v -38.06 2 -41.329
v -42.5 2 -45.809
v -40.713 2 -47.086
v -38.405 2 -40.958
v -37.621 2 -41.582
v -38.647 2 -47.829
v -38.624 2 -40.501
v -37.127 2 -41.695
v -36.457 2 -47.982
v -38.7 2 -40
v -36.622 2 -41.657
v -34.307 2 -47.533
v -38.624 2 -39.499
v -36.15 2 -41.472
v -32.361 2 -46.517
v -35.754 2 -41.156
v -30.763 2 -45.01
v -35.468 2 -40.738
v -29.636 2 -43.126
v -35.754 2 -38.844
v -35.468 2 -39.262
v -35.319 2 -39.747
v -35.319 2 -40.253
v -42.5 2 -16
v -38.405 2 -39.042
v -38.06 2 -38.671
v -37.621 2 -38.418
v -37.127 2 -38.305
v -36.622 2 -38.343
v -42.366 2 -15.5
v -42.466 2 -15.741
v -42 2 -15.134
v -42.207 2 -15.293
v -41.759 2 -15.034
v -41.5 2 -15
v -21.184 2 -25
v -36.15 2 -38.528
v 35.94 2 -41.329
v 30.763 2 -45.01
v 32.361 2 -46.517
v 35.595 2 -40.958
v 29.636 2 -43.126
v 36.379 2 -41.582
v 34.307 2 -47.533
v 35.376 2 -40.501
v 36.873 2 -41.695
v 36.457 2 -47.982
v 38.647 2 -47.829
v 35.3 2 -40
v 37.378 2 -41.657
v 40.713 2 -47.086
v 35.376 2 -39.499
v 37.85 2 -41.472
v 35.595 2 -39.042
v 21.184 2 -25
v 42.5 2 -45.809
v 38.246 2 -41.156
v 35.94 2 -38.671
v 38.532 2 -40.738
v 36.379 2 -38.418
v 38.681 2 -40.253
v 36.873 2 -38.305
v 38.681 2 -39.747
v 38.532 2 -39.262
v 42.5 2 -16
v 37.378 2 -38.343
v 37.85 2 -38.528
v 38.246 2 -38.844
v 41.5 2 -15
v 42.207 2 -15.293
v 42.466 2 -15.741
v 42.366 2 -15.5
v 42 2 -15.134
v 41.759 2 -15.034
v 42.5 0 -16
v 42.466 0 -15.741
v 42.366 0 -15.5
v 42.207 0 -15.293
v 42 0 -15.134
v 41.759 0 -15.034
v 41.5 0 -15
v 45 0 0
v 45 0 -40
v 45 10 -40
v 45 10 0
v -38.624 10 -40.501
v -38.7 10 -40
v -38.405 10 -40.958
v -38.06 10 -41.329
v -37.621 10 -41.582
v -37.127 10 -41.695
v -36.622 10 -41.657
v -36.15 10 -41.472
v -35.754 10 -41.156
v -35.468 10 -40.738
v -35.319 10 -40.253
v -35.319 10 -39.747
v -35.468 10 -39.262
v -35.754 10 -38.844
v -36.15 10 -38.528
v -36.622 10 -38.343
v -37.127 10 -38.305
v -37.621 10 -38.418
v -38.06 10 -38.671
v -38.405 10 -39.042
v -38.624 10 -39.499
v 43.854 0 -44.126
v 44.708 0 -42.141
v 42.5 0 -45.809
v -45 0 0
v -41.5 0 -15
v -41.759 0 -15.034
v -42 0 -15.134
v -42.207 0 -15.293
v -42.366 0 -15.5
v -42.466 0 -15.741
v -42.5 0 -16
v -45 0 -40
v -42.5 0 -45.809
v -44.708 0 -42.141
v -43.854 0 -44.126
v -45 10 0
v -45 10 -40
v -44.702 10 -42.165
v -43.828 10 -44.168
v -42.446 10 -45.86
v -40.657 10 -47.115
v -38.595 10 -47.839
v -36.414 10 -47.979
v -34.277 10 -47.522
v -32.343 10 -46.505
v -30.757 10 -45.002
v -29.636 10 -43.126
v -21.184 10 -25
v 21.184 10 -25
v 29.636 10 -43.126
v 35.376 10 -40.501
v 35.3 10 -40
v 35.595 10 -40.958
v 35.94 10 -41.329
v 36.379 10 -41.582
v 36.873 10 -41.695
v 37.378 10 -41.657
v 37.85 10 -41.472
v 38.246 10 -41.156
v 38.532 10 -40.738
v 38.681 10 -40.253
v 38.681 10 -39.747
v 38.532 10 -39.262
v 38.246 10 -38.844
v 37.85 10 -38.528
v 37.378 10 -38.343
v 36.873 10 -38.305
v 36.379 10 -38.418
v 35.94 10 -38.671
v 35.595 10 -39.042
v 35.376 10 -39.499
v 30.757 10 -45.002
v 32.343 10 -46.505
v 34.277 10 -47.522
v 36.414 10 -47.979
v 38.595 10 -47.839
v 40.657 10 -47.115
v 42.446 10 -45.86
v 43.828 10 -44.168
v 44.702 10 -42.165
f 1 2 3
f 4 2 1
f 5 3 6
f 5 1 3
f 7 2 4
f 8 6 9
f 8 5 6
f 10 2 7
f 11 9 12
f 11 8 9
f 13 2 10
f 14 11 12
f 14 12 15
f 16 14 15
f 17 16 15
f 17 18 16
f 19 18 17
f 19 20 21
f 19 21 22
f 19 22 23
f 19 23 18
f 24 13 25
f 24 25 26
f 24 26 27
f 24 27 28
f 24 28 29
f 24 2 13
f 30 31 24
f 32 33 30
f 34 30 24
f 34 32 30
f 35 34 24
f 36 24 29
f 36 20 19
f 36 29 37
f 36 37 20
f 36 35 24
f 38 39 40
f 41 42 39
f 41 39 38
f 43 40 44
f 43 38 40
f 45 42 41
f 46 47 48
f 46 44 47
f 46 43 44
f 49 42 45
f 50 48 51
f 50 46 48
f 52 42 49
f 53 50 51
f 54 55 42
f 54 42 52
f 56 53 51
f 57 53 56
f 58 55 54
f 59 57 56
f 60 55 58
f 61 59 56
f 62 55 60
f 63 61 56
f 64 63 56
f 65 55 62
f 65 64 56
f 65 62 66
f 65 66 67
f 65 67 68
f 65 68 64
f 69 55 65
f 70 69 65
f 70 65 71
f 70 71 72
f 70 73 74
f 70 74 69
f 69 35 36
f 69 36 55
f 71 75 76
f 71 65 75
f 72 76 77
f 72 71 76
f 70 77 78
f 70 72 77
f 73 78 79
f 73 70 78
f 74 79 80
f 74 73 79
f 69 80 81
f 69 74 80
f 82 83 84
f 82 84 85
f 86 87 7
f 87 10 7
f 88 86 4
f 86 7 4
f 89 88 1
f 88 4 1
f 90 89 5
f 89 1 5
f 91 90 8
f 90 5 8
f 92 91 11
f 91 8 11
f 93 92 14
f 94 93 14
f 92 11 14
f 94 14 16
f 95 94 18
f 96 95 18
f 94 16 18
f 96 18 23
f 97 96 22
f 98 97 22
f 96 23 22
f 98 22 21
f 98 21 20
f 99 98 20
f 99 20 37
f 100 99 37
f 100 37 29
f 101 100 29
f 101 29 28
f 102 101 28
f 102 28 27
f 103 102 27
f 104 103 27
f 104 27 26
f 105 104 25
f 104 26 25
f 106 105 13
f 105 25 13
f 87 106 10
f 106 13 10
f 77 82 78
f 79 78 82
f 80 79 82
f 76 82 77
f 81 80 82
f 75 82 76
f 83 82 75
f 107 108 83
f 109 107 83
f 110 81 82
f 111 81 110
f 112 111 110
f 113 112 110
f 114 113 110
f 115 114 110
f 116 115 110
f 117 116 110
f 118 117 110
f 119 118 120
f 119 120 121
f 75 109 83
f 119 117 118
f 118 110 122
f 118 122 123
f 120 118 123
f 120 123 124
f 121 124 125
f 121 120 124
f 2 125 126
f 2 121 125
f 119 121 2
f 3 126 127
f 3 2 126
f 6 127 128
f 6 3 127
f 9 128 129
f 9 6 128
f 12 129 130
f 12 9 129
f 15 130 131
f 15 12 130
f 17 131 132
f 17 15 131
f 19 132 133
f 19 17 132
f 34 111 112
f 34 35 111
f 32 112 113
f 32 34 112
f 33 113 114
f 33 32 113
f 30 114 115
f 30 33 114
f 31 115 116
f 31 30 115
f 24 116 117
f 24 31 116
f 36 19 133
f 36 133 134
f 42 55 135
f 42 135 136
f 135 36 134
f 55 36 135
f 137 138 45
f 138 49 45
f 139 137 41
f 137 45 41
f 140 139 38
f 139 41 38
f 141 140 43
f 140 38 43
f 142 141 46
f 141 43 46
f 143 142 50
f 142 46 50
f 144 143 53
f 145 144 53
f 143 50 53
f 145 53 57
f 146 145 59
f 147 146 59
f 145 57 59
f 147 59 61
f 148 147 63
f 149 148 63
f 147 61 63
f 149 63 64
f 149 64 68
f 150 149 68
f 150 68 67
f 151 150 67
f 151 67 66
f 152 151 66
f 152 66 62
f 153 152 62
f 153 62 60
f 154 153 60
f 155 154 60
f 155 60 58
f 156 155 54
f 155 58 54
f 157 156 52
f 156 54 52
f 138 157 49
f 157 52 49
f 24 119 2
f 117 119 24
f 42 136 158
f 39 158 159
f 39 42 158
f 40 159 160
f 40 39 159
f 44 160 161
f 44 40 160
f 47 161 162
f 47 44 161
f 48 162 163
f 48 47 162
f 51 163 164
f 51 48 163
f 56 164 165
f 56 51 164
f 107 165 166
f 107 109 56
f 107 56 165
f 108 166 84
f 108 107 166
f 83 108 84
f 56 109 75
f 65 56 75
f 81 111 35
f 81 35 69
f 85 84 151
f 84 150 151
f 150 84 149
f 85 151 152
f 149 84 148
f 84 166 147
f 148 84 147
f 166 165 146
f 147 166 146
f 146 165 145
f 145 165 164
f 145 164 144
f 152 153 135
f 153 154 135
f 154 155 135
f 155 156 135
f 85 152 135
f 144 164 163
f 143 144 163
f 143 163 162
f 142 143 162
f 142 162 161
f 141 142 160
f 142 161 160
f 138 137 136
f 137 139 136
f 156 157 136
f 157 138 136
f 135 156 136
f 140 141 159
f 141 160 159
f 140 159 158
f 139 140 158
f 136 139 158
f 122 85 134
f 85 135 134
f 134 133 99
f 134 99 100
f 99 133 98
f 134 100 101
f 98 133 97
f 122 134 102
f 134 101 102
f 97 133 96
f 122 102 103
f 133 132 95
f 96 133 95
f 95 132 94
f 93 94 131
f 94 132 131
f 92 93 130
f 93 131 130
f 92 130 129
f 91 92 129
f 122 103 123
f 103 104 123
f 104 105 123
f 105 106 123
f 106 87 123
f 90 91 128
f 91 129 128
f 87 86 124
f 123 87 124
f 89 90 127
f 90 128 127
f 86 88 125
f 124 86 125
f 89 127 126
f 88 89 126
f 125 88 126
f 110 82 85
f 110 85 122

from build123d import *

# Parameters (mm, degrees)
BOSS_EXTRUDE1_DEPTH      = 10
SKETCH2_W                = 85
SKETCH2_H                = 33
CUT_EXTRUDE1_DEPTH       = 2
FILLET1_R                = 1
M3_CLEARANCE_HOLE1_D     = 3.4
M3_CLEARANCE_HOLE1_DEPTH = 8
M3_CLEARANCE_HOLE1_TIP   = 1.021463052


with BuildPart() as part:
    # Sketch1 → Boss-Extrude1 (new body)
    with BuildSketch(Plane(origin=(0, 0, 0), x_dir=(1, 0, 0), z_dir=(0, 1, 0))):
        with BuildLine():
            Line((45, 0), (-45, 0))
            Line((-45, 0), (-45, 40))
            ThreePointArc((-45, 40), (-38.595106732, 47.83936442), (-29.636091372, 43.126155741))
            Line((-29.636091372, 43.126155741), (-21.183726137, 25))
            Line((-21.183726137, 25), (21.183726137, 25))
            Line((21.183726137, 25), (29.636091372, 43.126155741))
            ThreePointArc((29.636091372, 43.126155741), (38.595106732, 47.83936442), (45, 40))
            Line((45, 40), (45, 0))
        make_face()
    extrude(amount=BOSS_EXTRUDE1_DEPTH)

    # Sketch2 → Cut-Extrude1 (cut)
    with BuildSketch(Plane.XZ):
        with Locations((0, -31.5)):
            Rectangle(SKETCH2_W, SKETCH2_H)
    extrude(amount=-CUT_EXTRUDE1_DEPTH, mode=Mode.SUBTRACT)

    # Fillet1
    fillet1_edges = [part.edges().sort_by_distance(p)[0] for p in [
        (42.5, 1, -15),
        (-42.5, 1, -15),
    ]]
    fillet(fillet1_edges, radius=FILLET1_R)

    # M3 Clearance Hole1
    with Locations(Plane(origin=(0, 10, 0), x_dir=(1, 0, 0), z_dir=(0, 1, 0))):
        with Locations((-37, 40), (37, 40)):
            Hole(M3_CLEARANCE_HOLE1_D / 2, depth=M3_CLEARANCE_HOLE1_DEPTH)
            with Locations((0, 0, -(M3_CLEARANCE_HOLE1_DEPTH + M3_CLEARANCE_HOLE1_TIP / 2))):  # 118° drill point
                Cone(0, M3_CLEARANCE_HOLE1_D / 2, M3_CLEARANCE_HOLE1_TIP, mode=Mode.SUBTRACT)


solid = part.part
